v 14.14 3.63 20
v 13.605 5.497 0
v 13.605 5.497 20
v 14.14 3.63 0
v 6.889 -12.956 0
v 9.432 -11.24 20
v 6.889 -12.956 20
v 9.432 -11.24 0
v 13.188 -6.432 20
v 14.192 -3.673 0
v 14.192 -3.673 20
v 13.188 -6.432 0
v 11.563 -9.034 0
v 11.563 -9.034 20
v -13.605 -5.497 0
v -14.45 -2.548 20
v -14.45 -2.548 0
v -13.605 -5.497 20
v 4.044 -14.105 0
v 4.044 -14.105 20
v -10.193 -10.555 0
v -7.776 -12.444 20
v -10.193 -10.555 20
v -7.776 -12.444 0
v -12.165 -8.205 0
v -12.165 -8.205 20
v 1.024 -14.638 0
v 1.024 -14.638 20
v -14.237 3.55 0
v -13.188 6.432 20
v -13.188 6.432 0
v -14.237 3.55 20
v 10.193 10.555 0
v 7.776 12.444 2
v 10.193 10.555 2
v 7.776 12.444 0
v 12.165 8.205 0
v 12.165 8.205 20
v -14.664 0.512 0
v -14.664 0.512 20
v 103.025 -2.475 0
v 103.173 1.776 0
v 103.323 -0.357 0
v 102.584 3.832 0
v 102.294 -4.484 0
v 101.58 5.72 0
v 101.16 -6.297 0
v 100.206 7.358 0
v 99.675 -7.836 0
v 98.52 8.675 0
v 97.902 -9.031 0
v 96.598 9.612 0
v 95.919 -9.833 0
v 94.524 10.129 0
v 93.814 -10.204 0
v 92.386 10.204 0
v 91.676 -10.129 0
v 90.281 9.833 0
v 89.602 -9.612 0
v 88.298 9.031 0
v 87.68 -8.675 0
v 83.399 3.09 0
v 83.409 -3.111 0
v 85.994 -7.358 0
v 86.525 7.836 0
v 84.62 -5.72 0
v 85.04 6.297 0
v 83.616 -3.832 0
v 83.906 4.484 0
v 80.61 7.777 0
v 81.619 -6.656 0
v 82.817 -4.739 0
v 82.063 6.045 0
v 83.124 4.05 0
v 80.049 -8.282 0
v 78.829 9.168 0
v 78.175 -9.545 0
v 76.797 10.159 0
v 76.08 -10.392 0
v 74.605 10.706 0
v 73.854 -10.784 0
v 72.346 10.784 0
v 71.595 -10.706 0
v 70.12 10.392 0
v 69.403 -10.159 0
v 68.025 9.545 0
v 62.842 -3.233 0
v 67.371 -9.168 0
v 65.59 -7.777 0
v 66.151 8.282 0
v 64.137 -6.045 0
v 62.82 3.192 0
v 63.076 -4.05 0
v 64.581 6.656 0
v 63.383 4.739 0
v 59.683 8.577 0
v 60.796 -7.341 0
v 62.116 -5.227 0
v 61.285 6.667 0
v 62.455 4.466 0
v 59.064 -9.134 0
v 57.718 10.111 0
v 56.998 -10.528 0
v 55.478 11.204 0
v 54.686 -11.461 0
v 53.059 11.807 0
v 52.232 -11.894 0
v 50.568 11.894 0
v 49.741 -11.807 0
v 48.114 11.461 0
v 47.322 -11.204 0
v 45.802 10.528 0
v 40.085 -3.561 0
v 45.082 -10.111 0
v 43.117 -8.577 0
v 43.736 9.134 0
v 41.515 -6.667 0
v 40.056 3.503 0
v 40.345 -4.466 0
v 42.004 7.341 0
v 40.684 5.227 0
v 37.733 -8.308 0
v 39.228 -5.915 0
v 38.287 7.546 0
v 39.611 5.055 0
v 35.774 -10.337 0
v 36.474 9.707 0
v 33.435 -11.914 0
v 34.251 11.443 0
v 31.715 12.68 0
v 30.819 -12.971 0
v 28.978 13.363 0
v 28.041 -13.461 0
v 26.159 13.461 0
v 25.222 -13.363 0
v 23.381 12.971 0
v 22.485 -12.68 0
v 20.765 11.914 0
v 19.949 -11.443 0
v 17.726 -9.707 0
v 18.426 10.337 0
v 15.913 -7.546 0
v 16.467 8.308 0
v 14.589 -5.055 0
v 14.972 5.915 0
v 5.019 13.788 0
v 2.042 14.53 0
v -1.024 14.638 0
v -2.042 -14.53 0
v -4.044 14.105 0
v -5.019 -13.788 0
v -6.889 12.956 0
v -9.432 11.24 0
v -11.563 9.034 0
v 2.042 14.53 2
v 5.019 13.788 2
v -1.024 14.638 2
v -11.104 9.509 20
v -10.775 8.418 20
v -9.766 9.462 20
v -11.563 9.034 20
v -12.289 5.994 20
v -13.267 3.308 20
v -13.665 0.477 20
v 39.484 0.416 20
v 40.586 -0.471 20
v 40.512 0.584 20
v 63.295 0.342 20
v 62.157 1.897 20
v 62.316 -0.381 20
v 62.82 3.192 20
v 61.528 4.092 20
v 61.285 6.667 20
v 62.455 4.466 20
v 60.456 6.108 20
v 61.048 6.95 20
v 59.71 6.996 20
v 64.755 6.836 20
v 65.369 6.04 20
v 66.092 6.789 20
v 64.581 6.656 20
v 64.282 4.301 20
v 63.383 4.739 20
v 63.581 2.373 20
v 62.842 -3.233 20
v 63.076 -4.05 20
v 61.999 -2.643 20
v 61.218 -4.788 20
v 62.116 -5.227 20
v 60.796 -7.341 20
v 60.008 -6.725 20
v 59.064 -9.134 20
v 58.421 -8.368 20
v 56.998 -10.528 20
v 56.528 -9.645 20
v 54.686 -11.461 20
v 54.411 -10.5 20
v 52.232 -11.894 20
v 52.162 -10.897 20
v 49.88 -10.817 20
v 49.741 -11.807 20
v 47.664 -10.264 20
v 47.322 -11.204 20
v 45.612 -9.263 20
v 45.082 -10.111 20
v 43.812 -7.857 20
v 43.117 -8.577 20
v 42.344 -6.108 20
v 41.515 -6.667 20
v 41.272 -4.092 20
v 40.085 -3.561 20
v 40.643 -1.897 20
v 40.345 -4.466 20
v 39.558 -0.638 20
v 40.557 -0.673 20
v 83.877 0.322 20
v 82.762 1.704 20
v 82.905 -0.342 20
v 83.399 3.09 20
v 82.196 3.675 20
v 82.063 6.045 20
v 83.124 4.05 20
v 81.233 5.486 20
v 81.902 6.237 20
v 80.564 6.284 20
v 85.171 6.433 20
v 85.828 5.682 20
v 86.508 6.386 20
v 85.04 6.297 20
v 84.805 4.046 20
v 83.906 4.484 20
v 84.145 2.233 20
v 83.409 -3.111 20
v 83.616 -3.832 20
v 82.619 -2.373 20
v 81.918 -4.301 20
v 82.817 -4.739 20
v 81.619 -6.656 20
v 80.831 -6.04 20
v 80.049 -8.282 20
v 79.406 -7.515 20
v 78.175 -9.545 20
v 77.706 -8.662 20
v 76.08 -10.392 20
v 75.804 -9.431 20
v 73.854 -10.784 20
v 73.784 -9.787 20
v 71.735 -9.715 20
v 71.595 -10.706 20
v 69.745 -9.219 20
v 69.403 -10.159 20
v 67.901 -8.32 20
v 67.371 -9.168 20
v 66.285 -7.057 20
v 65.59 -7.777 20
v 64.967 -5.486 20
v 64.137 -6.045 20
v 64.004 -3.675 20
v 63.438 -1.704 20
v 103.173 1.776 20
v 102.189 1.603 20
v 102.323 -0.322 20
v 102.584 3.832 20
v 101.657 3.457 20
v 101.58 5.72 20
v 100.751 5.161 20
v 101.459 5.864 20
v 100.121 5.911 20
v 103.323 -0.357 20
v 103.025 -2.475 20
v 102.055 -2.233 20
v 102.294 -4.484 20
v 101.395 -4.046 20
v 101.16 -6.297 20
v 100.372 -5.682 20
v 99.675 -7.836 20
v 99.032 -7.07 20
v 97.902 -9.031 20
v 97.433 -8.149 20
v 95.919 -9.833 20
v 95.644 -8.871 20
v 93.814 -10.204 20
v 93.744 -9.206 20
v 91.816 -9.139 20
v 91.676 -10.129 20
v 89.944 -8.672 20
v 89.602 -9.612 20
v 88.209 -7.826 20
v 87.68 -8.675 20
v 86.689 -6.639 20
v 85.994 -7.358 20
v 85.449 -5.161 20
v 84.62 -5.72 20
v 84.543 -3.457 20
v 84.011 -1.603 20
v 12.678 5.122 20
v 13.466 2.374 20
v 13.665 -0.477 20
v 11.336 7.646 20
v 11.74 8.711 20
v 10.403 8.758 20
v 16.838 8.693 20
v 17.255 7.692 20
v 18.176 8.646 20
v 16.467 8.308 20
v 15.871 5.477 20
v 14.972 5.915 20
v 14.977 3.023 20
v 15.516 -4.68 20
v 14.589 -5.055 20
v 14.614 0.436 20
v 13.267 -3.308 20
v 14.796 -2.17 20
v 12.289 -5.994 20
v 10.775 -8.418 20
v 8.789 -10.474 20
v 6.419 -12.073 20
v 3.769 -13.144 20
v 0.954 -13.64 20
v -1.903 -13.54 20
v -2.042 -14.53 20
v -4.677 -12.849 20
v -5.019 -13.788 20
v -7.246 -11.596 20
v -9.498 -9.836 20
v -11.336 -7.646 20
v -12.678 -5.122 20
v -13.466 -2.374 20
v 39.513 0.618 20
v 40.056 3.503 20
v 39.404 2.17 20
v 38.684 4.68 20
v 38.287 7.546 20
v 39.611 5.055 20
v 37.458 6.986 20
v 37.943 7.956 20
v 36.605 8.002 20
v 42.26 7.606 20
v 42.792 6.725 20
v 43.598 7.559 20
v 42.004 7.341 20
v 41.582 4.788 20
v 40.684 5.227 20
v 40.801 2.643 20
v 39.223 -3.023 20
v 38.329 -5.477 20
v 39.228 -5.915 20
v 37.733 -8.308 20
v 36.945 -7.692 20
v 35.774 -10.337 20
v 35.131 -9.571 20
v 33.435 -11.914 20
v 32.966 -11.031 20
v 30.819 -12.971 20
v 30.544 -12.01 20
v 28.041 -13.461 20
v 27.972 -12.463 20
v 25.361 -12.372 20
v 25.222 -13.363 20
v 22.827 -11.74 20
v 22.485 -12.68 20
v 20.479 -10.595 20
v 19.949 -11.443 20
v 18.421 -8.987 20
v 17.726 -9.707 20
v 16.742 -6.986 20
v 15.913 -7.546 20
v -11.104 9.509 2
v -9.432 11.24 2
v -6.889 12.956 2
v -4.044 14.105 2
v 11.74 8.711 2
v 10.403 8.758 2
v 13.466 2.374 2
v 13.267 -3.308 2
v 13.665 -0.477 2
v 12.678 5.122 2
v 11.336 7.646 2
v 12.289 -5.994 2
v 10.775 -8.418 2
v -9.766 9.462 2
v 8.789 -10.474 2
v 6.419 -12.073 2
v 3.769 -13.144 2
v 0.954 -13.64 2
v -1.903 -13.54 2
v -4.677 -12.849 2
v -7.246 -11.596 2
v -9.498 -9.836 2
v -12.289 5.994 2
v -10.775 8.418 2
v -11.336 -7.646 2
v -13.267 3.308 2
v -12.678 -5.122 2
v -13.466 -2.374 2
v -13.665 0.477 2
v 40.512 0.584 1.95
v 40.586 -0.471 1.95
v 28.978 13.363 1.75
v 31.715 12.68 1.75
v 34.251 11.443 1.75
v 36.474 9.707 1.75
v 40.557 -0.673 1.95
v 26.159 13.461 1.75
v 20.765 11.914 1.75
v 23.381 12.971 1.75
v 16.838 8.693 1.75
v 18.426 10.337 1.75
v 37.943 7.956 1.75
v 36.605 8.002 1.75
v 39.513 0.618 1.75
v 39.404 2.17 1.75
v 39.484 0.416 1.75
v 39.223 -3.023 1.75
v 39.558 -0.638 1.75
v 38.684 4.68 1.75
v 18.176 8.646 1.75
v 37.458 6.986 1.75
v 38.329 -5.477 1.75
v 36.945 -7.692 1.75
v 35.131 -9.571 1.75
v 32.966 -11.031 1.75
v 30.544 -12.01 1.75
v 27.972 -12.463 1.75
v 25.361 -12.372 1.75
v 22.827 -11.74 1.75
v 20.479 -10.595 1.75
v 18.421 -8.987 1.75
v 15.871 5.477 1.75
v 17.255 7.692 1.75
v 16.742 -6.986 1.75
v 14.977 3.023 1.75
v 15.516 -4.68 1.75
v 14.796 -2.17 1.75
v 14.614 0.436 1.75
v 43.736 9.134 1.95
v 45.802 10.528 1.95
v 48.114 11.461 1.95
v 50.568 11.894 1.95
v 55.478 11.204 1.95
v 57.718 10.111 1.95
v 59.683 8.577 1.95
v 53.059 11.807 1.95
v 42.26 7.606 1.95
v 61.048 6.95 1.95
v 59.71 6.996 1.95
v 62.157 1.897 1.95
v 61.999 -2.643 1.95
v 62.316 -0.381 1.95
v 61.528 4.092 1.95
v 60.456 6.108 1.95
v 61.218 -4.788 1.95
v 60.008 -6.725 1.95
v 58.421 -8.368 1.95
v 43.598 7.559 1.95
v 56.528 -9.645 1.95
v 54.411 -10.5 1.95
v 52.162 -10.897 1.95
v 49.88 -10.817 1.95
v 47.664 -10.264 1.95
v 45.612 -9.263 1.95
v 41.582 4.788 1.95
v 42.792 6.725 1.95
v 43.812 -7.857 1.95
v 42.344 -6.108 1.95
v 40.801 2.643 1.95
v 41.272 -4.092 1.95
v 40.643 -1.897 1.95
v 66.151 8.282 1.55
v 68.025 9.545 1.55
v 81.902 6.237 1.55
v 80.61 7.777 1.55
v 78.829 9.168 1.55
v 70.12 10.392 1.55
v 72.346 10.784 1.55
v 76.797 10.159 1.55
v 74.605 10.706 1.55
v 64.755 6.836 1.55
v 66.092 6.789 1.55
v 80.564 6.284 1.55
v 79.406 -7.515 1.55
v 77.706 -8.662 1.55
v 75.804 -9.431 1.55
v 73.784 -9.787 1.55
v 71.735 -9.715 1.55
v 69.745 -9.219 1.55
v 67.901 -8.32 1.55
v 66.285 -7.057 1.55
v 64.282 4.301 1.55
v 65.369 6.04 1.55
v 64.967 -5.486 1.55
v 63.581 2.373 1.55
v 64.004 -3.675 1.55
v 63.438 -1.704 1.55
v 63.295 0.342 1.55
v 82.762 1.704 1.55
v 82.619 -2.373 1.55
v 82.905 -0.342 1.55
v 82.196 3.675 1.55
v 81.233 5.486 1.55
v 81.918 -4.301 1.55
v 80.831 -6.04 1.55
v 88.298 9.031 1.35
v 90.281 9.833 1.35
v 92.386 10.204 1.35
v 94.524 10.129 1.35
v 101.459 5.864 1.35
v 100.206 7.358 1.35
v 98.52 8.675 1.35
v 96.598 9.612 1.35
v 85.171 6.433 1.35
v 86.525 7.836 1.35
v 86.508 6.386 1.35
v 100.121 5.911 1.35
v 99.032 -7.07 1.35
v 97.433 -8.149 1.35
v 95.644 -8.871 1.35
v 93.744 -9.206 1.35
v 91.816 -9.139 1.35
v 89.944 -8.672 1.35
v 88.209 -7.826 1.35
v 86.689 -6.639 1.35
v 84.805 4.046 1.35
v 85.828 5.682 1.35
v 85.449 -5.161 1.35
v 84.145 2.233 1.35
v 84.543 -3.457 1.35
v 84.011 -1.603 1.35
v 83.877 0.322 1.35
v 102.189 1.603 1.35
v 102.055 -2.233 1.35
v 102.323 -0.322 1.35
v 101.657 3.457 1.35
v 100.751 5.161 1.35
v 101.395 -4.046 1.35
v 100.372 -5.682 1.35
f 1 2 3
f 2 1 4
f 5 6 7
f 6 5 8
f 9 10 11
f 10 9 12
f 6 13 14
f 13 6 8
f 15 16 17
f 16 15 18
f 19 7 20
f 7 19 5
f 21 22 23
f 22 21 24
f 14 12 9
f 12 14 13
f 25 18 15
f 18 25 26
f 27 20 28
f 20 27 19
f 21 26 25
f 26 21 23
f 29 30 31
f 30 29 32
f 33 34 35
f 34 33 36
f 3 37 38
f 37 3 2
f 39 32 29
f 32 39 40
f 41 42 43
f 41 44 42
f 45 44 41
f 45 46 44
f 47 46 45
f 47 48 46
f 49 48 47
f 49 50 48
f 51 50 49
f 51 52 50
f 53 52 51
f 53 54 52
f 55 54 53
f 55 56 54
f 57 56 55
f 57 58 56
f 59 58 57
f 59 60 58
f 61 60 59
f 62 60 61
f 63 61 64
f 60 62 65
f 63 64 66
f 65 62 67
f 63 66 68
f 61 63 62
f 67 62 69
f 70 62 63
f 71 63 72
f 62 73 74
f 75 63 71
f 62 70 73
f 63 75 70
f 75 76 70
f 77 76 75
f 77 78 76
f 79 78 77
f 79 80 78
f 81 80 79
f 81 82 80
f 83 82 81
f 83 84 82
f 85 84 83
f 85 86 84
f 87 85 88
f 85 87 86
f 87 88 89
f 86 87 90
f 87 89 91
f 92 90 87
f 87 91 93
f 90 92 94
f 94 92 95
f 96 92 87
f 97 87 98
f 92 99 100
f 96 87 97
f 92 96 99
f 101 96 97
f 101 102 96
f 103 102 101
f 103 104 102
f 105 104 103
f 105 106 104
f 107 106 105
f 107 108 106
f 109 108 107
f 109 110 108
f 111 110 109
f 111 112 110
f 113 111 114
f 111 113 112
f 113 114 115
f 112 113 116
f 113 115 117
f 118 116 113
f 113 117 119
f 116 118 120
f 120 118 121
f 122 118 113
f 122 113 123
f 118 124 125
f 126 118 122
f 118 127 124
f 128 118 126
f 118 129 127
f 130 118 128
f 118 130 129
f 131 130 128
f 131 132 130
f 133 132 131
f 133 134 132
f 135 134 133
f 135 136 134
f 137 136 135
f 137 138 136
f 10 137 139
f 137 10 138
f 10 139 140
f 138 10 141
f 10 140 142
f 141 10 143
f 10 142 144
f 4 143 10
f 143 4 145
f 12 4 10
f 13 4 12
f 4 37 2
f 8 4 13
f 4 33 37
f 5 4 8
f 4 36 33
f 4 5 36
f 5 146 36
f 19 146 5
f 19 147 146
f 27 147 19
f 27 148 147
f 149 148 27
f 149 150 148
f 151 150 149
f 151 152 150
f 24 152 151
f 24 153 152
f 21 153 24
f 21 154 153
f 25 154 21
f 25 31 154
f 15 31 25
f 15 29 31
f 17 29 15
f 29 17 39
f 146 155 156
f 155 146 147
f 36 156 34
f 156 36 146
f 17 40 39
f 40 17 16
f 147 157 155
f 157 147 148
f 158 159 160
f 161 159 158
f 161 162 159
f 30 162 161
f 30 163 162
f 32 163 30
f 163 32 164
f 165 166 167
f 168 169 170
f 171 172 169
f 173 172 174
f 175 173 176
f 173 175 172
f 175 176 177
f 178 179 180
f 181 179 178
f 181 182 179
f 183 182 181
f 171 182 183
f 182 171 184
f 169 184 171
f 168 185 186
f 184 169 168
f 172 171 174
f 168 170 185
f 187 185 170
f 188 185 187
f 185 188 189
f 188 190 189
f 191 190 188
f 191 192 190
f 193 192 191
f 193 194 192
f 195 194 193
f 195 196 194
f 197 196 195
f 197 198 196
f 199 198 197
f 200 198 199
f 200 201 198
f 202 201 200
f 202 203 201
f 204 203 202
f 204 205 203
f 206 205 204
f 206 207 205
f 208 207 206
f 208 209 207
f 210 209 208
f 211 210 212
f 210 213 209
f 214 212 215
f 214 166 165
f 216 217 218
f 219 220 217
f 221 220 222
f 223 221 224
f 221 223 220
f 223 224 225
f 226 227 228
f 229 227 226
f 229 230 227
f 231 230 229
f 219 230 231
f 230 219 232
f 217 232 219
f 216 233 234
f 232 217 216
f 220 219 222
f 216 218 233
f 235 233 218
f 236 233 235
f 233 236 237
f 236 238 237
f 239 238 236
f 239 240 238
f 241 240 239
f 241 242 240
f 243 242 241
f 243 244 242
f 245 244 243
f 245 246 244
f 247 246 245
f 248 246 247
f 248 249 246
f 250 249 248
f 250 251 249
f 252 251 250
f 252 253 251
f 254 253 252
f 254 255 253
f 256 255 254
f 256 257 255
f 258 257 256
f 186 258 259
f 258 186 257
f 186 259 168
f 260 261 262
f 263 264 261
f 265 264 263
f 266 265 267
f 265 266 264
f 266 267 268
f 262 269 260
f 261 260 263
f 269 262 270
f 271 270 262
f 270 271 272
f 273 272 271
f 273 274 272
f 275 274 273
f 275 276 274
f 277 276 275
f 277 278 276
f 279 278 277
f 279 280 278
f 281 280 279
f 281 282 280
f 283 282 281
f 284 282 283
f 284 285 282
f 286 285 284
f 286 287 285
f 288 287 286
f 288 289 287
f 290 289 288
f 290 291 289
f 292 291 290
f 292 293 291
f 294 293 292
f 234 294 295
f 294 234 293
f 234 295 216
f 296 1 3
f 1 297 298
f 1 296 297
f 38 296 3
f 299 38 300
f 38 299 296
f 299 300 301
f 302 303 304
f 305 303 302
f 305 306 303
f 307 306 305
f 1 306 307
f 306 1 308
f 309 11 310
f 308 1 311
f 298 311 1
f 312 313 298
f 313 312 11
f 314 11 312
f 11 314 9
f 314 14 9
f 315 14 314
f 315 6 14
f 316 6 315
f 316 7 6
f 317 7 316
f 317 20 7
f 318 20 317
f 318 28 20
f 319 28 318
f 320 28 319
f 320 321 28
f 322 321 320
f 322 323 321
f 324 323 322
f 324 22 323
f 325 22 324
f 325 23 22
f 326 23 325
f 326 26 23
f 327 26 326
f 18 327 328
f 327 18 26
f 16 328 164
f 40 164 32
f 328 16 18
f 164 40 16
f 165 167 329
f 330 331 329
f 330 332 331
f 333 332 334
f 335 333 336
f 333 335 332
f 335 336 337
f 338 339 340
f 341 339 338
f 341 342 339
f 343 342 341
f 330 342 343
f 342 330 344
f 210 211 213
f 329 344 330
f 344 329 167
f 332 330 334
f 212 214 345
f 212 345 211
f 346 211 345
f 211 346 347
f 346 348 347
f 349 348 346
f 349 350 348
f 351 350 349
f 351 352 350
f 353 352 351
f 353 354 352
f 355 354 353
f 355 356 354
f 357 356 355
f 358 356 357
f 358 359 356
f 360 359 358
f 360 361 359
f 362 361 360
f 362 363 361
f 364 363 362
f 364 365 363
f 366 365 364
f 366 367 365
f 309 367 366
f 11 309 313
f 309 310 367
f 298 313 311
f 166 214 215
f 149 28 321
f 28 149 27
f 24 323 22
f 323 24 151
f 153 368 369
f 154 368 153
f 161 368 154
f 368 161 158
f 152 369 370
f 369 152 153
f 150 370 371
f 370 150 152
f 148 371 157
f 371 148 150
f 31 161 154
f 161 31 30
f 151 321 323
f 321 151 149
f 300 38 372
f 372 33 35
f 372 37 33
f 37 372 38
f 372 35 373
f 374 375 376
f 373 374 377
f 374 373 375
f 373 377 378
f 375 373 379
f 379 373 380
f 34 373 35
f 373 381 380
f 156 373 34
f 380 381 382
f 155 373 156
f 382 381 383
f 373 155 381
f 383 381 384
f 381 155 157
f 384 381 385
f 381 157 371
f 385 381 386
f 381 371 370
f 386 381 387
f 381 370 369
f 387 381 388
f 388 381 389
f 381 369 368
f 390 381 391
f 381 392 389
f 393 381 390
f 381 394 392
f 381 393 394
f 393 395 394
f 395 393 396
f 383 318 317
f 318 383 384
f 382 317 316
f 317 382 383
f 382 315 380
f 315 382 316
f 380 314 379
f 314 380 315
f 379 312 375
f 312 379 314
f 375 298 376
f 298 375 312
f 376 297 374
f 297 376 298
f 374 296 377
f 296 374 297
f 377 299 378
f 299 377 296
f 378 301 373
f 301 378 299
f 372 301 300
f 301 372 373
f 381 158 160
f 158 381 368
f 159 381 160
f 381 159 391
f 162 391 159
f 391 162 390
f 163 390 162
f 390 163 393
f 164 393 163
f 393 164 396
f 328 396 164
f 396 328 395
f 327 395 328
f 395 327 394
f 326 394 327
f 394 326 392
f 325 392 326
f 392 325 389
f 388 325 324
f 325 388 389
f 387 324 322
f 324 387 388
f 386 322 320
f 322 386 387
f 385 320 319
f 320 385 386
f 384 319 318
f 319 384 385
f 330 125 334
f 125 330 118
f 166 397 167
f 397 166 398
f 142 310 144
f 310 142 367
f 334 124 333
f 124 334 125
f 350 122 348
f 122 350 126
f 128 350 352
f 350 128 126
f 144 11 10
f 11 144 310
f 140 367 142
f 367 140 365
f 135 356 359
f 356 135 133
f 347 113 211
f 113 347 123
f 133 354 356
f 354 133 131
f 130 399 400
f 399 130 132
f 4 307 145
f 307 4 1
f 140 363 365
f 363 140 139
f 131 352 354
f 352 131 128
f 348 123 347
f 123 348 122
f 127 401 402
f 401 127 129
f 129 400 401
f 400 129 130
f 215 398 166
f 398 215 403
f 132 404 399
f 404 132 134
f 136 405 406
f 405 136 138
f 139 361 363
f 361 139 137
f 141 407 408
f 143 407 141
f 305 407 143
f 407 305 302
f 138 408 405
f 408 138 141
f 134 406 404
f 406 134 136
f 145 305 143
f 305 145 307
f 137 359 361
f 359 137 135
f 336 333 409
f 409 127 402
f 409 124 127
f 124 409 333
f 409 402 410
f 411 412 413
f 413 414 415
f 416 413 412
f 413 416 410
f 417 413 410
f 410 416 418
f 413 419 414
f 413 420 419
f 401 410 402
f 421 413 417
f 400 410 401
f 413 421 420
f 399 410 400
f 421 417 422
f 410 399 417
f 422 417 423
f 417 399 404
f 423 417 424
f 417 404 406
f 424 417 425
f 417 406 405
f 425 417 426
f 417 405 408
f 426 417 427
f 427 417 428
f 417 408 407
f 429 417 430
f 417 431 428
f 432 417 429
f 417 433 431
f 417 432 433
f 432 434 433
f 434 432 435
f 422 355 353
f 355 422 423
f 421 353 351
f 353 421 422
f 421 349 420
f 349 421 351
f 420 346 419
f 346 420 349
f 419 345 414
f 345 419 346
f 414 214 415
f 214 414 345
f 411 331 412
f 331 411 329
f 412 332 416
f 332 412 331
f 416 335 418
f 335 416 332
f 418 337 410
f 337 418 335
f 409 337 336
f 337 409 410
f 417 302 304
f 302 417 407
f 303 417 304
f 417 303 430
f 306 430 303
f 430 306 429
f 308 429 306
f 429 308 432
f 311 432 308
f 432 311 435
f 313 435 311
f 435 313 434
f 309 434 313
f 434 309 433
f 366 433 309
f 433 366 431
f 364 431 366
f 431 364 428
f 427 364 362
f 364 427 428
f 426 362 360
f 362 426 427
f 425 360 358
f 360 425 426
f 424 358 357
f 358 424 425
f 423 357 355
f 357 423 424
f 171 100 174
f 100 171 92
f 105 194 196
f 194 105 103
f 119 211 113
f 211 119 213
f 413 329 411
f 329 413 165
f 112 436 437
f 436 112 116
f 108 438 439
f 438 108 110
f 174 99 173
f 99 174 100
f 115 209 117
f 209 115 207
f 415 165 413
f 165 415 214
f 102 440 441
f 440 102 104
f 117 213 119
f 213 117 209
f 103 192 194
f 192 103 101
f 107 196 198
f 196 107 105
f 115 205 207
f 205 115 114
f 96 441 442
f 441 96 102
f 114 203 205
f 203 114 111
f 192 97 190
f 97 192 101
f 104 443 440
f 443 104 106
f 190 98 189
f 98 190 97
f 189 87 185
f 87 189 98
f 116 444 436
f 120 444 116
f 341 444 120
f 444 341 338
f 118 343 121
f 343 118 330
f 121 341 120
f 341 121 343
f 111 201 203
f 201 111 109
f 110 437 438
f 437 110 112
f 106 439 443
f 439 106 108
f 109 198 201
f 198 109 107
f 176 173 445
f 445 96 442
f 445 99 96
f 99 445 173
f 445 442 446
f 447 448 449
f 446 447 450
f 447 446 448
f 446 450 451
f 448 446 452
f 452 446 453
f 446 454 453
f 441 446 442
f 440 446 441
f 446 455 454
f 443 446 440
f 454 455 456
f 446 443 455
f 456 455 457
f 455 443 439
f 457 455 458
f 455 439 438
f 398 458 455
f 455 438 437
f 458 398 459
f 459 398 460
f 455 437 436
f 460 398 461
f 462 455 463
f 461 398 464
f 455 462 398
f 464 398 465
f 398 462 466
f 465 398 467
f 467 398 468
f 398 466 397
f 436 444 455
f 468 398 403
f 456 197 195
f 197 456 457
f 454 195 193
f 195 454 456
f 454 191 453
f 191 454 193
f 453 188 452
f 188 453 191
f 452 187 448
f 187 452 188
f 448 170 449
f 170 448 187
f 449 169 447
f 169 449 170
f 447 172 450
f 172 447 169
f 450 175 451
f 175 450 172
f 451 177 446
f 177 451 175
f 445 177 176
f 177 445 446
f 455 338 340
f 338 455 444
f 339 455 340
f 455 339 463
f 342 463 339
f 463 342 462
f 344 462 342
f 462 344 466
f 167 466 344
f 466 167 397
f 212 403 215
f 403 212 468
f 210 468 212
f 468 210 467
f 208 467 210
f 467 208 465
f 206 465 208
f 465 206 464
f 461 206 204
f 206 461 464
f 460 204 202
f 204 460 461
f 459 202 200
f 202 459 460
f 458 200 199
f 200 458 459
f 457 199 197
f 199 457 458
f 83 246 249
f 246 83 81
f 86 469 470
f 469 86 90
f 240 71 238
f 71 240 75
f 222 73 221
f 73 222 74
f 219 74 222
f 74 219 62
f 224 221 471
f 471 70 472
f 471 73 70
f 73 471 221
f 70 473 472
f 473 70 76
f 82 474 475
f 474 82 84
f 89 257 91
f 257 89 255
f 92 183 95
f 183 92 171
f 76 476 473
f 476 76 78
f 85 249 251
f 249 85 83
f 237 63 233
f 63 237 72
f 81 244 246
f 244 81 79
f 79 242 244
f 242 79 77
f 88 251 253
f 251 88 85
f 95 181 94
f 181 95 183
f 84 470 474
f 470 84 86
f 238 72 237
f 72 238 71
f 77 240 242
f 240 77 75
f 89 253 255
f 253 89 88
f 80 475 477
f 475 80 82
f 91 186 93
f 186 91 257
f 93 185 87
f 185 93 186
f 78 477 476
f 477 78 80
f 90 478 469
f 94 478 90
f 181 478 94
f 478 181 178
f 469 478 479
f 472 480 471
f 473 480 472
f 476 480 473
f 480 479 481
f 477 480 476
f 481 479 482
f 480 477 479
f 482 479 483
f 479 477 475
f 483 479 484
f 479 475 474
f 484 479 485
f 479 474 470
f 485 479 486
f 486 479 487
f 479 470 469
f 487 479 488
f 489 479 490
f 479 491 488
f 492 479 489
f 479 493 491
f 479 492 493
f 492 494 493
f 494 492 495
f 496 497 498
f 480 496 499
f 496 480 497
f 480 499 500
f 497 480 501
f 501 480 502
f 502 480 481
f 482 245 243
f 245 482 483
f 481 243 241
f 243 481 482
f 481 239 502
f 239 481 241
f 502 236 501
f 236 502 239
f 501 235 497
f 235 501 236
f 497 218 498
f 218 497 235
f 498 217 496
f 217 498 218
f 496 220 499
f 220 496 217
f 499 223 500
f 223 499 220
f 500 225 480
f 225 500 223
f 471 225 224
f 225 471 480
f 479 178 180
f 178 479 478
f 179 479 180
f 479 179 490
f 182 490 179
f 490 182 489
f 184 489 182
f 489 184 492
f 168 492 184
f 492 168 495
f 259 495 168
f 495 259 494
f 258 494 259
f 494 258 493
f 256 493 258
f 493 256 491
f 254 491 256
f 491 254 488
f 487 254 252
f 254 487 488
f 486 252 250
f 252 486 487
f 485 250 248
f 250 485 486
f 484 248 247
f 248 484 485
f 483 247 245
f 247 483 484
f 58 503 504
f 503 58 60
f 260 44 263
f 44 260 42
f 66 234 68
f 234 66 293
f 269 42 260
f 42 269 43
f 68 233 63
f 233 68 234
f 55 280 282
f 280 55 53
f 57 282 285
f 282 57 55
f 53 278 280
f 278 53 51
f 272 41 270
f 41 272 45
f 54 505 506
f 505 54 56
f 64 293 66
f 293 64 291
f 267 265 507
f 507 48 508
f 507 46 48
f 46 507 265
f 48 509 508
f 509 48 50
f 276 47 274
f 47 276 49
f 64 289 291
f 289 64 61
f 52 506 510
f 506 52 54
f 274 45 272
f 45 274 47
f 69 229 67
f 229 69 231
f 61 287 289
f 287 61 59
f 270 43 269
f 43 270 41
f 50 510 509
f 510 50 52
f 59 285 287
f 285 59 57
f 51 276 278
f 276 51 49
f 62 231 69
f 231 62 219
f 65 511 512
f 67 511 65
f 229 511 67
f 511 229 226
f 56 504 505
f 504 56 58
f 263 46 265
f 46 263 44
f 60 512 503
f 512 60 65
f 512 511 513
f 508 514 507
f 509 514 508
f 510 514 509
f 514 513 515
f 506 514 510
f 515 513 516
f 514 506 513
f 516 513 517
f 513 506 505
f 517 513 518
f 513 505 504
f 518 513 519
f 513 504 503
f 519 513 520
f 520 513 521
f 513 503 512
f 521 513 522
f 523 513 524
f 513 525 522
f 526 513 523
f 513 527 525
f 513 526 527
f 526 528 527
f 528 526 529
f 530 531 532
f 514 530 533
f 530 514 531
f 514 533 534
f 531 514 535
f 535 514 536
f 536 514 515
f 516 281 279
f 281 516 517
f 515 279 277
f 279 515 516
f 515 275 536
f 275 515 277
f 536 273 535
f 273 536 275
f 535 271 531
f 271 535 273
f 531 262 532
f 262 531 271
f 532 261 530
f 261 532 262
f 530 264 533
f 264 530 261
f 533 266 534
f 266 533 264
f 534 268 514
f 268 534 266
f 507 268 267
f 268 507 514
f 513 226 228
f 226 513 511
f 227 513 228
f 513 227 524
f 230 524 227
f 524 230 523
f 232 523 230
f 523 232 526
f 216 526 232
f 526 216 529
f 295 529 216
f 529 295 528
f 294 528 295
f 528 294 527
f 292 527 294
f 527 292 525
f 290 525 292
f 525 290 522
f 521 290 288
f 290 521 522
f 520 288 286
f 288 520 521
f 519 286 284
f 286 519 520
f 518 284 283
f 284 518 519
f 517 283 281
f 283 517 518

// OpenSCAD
$fn=30;
/* [PlacementOptions] */
// check this for two quarter holders.
secondQuarterHolderEnabled = false;
// check this for to for a dollar holder.
DollarHolderEnabled = true;

height = 20; // [1:50]
wallThickness = 1; // [1:5]
oversizePercent = 1.03; //[1.00:2.00]

// XY values are .1mm 
DollarX = 0;   // [-1000:1000]
// XY values are .1mm 
DollarY = 0;   // [-1000:1000]
// degree rotation for opening
DollarR = 313; // [0:360]

Quarter1X = 271; // [-1000:1000]
Quarter1Y = 0;   // [-1000:1000]
Quarter1R = 313; // [0:360]

// second quarter slot
Quarter2X = 0; // [-1000:1000]
Quarter2Y = 0; // [-1000:1000]
Quarter2R = 0; // [0:360]

DimeX = 931; // [-1000:1000]
DimeY = 0;   // [-1000:1000]
DimeR = 313; // [0:360]

NickelX = 514; // [-1000:1000]
NickelY = 0; // [-1000:1000]
NickelR = 313; // [0:360]

PennyX = 731; // [-1000:1000]
PennyY = 0; // [-1000:1000]
PennyR = 313; // [0:360]

module CoinHolder(coinDiameter, coinHeight)
{
    diameter= coinDiameter * oversizePercent;
    rotate([0,0,45])
    {
        difference()
        {
            linear_extrude(height)
            {
                circle(d=diameter + 2*wallThickness);
            }
            translate([0,0,coinHeight])
            {
                linear_extrude(height)
                {
                    union()
                    {
                        translate([0,diameter/2])square([diameter*2, diameter/3], center=true);
                        circle(d=diameter);
                    }
                }
            }
        }
    }    
}

module DollarHolder    (){CoinHolder(26.55 , 2   );}
module HalfDollarHolder(){CoinHolder(30.61 , 2.15);}
module QuarterHolder   (){CoinHolder(24.26 , 1.75);}
module DimeHolder      (){CoinHolder(17.92 , 1.35);}
module NickelHolder    (){CoinHolder(21.21 , 1.95);}
module PennyHolder     (){CoinHolder(19.05 , 1.55);}

if(DollarHolderEnabled) translate([DollarX/10,DollarY/10,0])     rotate([0,0,DollarR])   DollarHolder();
translate([Quarter1X/10,Quarter1Y/10,0]) rotate([0,0,Quarter1R]) QuarterHolder();
if(secondQuarterHolderEnabled) translate([Quarter2X/10,Quarter2Y/10,0]) rotate([0,0,Quarter2R]) QuarterHolder();
translate([NickelX/10,NickelY/10,0])     rotate([0,0,NickelR])   NickelHolder();
translate([PennyX/10,PennyY/10,0])       rotate([0,0,PennyR])    PennyHolder();
translate([DimeX/10,DimeY/10,0])         rotate([0,0,DimeR])     DimeHolder();
